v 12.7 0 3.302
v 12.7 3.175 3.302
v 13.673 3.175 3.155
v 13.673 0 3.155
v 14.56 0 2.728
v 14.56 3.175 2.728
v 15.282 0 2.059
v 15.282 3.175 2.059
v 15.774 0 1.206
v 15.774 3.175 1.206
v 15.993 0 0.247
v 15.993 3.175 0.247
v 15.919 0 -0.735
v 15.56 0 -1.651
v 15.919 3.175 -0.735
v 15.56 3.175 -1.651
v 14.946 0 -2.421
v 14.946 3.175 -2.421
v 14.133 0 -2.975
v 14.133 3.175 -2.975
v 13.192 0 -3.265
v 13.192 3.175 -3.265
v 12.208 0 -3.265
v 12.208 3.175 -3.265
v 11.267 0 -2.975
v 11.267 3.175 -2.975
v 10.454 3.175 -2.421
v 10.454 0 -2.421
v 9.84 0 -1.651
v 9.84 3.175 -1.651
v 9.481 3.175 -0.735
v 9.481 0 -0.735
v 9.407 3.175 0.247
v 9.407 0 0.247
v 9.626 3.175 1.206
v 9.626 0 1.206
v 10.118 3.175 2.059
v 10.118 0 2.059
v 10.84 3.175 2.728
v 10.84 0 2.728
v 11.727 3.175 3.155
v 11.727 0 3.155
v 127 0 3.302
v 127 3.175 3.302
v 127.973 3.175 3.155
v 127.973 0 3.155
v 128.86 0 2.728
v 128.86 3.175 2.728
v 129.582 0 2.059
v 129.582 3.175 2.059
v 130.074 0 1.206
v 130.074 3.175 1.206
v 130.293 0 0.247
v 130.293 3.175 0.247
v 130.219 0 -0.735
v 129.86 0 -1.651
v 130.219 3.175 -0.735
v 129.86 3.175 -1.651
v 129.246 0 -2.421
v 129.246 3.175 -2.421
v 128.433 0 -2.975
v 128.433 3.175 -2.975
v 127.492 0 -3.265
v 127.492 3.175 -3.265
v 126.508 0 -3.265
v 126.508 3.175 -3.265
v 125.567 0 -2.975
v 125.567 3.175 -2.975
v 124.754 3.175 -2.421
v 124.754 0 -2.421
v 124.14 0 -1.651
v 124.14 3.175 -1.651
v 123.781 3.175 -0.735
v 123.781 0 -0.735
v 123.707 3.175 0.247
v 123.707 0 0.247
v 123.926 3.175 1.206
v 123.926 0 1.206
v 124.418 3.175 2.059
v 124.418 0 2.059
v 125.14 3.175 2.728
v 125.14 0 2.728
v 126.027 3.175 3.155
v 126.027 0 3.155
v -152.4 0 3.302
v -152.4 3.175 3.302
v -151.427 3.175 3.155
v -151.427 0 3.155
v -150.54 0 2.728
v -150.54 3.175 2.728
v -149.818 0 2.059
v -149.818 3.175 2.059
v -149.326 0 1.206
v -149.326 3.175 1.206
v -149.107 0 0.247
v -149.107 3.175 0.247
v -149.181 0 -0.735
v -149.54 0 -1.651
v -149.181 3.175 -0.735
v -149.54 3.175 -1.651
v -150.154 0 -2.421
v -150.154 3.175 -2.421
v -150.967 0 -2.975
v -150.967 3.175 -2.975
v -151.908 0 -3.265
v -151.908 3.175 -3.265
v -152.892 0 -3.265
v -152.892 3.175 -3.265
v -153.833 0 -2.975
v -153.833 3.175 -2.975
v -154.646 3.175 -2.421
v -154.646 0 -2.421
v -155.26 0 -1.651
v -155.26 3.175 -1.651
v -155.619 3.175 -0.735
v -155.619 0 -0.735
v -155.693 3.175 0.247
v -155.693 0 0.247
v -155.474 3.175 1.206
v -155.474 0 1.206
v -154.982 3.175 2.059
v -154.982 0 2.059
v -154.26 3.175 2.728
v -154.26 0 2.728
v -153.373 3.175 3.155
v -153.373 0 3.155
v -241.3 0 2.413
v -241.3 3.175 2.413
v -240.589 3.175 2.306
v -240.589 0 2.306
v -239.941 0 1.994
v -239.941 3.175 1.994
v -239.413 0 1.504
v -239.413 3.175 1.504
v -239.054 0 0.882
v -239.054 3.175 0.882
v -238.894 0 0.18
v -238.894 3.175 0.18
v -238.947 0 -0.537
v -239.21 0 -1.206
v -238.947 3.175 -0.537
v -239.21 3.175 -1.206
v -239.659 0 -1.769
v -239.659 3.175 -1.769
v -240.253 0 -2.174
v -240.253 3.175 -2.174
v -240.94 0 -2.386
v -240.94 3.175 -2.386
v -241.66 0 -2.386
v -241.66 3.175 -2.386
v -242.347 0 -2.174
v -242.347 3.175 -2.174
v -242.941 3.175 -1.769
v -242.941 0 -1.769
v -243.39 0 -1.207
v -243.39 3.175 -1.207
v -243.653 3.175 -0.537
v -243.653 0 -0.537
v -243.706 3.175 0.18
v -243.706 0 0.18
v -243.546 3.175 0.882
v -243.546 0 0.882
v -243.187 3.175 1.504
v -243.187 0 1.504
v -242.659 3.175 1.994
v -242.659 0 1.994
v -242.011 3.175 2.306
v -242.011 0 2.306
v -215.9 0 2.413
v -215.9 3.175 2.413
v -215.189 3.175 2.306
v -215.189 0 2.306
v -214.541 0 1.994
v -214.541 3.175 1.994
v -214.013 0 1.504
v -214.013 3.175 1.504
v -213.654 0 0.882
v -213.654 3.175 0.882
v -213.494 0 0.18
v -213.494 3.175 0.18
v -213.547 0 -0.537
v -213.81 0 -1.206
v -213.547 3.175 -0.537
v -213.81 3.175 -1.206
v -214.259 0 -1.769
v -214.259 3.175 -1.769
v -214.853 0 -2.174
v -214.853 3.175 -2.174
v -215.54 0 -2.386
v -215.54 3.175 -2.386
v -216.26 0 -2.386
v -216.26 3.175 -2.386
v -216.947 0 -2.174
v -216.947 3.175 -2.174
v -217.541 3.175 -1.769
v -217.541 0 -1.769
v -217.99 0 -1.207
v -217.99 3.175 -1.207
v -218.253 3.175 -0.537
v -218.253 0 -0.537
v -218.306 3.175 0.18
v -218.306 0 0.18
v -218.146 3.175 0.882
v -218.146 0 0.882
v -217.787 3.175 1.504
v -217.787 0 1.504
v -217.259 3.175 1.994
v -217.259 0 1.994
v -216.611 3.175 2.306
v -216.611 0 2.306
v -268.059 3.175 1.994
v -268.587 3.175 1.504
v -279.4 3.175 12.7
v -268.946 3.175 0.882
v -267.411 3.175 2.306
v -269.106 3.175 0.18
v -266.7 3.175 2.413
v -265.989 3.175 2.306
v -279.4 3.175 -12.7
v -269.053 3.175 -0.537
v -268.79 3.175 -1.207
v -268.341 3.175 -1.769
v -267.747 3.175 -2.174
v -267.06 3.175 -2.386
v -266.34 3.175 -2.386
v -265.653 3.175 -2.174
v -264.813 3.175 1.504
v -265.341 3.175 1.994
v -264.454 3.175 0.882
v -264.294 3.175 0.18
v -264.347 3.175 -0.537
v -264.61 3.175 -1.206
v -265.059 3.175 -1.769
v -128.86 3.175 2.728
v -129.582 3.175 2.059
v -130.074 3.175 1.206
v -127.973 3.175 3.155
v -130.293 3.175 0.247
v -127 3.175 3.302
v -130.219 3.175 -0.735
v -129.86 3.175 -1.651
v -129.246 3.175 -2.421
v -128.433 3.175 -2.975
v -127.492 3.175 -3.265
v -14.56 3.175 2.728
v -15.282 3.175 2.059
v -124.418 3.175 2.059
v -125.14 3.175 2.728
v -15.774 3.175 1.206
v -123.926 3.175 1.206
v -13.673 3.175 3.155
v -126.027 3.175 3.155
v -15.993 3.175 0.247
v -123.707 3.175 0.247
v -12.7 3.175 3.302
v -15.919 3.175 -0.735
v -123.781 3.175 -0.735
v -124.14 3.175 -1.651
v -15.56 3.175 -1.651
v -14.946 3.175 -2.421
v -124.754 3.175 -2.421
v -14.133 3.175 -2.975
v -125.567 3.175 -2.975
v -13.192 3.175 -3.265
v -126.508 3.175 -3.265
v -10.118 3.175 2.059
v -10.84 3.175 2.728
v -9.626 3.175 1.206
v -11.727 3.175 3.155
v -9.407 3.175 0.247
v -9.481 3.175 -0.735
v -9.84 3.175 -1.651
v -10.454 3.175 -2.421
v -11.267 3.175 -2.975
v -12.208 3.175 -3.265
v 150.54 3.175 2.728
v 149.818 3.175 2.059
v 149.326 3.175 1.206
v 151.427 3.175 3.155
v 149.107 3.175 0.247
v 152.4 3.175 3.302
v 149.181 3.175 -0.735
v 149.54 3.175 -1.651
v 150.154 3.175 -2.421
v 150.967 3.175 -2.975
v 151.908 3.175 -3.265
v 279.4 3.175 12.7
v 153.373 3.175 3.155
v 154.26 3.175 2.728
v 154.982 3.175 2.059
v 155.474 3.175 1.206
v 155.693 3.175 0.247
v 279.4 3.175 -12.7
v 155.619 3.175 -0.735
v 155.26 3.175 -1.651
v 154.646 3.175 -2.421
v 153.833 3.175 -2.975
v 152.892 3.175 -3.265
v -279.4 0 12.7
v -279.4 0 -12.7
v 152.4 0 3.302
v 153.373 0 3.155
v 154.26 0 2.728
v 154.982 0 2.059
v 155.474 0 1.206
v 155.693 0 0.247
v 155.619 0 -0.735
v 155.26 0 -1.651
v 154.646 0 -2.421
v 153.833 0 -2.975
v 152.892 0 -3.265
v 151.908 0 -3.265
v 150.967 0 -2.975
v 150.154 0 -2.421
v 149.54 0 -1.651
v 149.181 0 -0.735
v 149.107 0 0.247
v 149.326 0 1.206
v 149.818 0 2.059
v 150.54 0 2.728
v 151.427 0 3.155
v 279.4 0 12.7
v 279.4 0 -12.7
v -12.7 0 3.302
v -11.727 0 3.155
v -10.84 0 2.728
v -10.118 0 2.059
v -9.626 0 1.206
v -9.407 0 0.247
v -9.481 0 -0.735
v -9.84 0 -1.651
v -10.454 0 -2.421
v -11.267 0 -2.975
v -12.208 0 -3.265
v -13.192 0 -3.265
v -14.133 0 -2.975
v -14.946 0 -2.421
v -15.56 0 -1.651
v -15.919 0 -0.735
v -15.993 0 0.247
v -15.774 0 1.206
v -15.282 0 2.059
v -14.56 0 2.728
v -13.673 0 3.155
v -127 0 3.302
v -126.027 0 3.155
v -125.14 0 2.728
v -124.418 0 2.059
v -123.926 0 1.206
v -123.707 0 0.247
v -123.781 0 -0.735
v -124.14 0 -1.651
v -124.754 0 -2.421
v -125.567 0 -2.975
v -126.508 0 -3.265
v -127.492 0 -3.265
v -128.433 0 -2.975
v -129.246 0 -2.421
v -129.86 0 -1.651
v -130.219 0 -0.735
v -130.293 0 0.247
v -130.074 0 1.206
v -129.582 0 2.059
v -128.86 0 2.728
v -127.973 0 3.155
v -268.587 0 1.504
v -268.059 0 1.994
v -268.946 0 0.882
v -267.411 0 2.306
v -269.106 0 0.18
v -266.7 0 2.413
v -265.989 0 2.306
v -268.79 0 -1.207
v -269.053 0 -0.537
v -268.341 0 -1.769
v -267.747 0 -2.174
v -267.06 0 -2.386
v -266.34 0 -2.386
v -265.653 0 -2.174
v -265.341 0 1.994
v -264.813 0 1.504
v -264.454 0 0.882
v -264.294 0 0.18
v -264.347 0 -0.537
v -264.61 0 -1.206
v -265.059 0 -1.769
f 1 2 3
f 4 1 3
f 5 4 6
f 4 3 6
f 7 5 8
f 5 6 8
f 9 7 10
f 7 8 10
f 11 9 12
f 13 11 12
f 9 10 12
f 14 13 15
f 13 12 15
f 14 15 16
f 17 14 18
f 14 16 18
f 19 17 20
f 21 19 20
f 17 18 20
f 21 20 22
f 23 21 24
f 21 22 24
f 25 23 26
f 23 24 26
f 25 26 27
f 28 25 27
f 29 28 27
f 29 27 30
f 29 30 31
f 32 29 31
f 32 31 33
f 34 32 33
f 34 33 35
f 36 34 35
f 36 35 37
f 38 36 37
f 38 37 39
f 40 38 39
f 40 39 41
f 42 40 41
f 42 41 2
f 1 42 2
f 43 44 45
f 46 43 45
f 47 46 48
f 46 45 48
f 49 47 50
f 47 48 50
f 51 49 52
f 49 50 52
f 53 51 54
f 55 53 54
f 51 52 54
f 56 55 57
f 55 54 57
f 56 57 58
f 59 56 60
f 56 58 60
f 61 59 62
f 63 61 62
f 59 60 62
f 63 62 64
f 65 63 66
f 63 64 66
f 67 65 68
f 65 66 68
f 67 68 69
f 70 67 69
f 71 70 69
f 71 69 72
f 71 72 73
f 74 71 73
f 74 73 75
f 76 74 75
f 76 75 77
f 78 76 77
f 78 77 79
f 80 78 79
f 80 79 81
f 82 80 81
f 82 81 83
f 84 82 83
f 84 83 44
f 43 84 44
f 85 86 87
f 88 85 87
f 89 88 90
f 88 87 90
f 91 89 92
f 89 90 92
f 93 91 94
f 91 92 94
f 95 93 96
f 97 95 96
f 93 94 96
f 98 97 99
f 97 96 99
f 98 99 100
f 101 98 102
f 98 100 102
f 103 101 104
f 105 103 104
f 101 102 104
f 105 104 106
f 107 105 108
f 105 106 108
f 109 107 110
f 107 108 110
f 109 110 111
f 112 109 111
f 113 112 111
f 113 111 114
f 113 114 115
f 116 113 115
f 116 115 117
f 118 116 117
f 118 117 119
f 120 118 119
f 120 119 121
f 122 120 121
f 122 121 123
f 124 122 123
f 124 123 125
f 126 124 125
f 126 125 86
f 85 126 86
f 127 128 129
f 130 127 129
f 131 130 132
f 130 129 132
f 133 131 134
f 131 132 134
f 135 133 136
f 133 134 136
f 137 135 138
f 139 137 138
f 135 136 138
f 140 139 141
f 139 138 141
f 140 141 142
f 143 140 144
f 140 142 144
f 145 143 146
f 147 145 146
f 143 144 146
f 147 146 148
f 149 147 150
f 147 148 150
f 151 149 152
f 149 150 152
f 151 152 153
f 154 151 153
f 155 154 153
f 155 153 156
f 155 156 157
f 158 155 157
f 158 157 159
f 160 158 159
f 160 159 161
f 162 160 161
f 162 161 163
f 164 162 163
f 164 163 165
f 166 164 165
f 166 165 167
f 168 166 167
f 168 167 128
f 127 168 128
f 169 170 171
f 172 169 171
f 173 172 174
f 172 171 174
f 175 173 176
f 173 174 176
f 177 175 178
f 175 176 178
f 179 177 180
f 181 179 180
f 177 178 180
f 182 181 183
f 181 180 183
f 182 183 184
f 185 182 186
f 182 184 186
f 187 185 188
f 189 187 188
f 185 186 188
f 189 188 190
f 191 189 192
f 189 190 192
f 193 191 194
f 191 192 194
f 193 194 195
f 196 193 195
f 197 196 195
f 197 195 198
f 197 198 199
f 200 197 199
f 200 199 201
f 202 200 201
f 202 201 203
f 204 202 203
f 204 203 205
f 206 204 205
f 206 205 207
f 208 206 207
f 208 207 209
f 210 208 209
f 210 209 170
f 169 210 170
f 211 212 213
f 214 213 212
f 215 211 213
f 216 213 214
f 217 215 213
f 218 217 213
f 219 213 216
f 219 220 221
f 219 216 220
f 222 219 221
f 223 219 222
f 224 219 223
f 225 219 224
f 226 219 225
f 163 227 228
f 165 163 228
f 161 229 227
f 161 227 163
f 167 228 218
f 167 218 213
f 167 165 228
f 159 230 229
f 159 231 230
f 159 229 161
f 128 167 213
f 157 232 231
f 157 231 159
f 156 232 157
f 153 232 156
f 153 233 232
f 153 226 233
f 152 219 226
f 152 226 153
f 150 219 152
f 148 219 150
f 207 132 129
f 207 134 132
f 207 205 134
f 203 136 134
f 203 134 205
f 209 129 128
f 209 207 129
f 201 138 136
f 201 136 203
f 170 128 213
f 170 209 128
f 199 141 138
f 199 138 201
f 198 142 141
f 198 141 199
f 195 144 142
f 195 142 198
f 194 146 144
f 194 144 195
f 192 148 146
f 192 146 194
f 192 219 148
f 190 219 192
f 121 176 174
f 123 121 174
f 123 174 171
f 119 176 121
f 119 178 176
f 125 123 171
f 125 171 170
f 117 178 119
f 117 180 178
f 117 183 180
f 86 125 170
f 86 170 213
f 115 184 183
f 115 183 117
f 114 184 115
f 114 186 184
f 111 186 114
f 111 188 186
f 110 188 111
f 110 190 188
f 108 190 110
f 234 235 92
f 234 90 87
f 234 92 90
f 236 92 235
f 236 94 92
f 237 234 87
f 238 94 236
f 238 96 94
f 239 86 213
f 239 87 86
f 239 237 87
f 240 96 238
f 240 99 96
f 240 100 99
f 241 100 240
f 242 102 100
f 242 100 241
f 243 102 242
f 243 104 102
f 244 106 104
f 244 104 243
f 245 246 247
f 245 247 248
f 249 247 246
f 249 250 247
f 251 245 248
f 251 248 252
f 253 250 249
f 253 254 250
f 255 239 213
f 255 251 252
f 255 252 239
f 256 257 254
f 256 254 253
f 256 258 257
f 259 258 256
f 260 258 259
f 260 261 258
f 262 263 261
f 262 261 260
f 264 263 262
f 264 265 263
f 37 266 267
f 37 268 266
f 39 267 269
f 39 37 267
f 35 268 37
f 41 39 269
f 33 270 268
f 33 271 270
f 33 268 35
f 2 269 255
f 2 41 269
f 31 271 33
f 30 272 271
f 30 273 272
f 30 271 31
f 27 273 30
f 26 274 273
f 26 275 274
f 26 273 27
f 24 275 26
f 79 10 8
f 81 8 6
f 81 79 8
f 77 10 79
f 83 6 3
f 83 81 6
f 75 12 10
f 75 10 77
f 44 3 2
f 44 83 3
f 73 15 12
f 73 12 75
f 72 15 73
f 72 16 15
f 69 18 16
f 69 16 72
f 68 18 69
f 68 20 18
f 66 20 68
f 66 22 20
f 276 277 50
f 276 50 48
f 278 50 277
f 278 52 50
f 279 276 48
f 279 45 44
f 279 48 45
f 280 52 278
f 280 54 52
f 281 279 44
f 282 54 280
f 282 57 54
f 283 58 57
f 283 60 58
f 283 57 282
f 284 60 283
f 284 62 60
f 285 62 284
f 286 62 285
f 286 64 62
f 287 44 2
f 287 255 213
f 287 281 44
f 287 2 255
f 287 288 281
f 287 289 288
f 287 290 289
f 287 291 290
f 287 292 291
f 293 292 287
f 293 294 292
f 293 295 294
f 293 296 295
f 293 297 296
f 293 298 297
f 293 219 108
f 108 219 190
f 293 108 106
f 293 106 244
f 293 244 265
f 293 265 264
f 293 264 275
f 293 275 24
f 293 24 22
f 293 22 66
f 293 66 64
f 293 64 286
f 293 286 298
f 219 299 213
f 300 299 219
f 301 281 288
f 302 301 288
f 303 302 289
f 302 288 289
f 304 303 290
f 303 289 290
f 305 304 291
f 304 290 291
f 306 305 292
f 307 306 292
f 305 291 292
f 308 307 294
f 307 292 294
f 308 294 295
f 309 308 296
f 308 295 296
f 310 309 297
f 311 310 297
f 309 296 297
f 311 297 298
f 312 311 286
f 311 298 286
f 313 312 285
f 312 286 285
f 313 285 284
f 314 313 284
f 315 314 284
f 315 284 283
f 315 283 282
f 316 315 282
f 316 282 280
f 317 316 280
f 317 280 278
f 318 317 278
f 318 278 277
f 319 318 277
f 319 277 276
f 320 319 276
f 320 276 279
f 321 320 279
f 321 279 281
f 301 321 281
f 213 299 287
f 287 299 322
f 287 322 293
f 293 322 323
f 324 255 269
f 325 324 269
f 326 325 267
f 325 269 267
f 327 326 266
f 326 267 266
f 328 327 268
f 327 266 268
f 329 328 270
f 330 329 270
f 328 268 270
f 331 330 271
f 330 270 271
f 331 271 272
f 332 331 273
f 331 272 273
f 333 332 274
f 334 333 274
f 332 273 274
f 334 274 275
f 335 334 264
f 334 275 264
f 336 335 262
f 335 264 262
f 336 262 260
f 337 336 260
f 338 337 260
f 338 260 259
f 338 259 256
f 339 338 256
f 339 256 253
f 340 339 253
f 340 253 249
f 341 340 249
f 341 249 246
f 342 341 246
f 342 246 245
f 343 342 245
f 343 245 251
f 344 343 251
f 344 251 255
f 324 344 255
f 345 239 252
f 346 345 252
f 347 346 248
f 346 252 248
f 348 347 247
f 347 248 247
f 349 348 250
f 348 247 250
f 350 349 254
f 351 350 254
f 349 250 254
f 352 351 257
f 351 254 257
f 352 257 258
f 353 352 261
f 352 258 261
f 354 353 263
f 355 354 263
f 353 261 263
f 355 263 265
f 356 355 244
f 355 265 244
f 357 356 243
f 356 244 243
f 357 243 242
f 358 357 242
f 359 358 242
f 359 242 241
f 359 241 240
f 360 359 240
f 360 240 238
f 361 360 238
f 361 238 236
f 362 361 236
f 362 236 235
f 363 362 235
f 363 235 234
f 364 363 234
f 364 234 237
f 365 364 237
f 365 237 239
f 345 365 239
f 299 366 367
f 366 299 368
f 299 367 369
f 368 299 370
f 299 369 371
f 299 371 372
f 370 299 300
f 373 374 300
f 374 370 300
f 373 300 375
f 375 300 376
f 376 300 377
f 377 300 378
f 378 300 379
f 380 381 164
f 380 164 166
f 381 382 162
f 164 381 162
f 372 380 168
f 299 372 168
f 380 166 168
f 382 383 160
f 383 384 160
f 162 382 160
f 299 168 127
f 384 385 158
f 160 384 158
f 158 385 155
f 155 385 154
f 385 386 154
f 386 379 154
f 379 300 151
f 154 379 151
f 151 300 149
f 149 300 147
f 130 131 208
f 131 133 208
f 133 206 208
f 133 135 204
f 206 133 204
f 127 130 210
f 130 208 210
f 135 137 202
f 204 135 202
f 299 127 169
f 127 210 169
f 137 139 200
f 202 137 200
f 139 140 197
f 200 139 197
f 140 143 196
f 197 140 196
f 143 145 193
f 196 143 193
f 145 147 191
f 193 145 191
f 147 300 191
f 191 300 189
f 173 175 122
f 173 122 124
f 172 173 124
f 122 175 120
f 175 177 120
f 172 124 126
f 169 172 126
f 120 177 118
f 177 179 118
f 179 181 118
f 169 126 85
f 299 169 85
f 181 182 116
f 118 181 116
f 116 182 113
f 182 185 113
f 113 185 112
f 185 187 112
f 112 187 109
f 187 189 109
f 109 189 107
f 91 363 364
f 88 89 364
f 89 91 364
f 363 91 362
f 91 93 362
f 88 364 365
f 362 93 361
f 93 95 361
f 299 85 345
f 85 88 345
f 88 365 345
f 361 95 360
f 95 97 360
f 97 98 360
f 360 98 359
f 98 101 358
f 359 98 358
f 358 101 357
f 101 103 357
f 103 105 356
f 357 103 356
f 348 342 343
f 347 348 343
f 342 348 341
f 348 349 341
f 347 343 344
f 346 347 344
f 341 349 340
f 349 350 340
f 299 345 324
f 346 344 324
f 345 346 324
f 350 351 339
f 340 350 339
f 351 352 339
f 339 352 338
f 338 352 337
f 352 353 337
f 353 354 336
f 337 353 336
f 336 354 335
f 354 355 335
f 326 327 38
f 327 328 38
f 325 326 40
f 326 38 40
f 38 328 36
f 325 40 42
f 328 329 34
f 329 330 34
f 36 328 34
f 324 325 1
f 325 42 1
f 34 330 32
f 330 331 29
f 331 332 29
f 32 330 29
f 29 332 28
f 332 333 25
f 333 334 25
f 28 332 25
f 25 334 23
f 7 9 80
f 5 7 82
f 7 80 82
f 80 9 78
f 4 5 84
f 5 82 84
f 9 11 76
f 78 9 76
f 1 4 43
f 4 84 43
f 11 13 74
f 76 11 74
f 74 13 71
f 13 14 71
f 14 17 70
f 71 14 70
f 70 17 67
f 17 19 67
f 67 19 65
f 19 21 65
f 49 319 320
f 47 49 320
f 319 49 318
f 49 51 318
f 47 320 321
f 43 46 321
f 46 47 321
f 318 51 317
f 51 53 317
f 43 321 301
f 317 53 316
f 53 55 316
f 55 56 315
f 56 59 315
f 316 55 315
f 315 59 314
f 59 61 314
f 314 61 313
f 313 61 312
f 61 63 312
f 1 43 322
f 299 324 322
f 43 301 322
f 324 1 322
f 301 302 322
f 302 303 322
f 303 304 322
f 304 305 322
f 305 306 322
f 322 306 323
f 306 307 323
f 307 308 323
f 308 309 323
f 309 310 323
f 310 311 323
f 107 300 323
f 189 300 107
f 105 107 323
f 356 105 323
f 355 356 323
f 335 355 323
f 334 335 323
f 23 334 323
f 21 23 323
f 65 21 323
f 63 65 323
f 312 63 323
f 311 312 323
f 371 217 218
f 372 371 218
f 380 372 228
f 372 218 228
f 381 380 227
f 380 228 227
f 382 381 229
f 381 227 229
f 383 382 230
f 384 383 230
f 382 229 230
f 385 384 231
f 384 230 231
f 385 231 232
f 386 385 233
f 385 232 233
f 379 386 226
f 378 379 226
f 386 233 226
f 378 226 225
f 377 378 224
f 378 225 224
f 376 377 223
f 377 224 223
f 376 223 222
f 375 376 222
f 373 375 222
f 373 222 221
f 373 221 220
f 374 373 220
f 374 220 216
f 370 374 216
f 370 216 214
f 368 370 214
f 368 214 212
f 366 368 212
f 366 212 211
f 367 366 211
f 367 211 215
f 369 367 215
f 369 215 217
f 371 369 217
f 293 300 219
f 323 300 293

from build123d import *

# Parameters (mm, degrees)
SKETCH1_W           = 558.8
SKETCH1_H           = 25.4
BOSS_EXTRUDE1_DEPTH = 3.175
SKETCH2_R           = 2.413
CUT_EXTRUDE1_DEPTH  = 280.706508013
SKETCH3_R           = 3.302
CUT_EXTRUDE2_DEPTH  = 280.706508013


with BuildPart() as part:
    # Sketch1 → Boss-Extrude1 (new body)
    with BuildSketch(Plane(origin=(0, 0, 0), x_dir=(1, 0, 0), z_dir=(0, 1, 0))):
        Rectangle(SKETCH1_W, SKETCH1_H)
    extrude(amount=BOSS_EXTRUDE1_DEPTH)

    # Sketch2 → Cut-Extrude1 (cut, through all)
    with BuildSketch(Plane(origin=(0, 3.175, 0), x_dir=(1, 0, 0), z_dir=(0, 1, 0))):
        with Locations(Location((-266.7, 0, 0), (0, 0, 270))):
            Circle(SKETCH2_R)
        with Locations(Location((-241.3, 0, 0), (0, 0, 270))):
            Circle(SKETCH2_R)
        with Locations(Location((-215.9, 0, 0), (0, 0, 270))):
            Circle(SKETCH2_R)
    extrude(amount=-CUT_EXTRUDE1_DEPTH, mode=Mode.SUBTRACT)

    # Sketch3 → Cut-Extrude2 (cut, through all)
    with BuildSketch(Plane(origin=(0, 3.175, 0), x_dir=(1, 0, 0), z_dir=(0, 1, 0))):
        with Locations(Location((-152.4, 0, 0), (0, 0, 270))):
            Circle(SKETCH3_R)
        with Locations(Location((-127, 0, 0), (0, 0, 270))):
            Circle(SKETCH3_R)
        with Locations(Location((-12.7, 0, 0), (0, 0, 270))):
            Circle(SKETCH3_R)
        with Locations(Location((12.7, 0, 0), (0, 0, 270))):
            Circle(SKETCH3_R)
        with Locations(Location((127, 0, 0), (0, 0, 270))):
            Circle(SKETCH3_R)
        with Locations(Location((152.4, 0, 0), (0, 0, 270))):
            Circle(SKETCH3_R)
    extrude(amount=-CUT_EXTRUDE2_DEPTH, mode=Mode.SUBTRACT)


solid = part.part
